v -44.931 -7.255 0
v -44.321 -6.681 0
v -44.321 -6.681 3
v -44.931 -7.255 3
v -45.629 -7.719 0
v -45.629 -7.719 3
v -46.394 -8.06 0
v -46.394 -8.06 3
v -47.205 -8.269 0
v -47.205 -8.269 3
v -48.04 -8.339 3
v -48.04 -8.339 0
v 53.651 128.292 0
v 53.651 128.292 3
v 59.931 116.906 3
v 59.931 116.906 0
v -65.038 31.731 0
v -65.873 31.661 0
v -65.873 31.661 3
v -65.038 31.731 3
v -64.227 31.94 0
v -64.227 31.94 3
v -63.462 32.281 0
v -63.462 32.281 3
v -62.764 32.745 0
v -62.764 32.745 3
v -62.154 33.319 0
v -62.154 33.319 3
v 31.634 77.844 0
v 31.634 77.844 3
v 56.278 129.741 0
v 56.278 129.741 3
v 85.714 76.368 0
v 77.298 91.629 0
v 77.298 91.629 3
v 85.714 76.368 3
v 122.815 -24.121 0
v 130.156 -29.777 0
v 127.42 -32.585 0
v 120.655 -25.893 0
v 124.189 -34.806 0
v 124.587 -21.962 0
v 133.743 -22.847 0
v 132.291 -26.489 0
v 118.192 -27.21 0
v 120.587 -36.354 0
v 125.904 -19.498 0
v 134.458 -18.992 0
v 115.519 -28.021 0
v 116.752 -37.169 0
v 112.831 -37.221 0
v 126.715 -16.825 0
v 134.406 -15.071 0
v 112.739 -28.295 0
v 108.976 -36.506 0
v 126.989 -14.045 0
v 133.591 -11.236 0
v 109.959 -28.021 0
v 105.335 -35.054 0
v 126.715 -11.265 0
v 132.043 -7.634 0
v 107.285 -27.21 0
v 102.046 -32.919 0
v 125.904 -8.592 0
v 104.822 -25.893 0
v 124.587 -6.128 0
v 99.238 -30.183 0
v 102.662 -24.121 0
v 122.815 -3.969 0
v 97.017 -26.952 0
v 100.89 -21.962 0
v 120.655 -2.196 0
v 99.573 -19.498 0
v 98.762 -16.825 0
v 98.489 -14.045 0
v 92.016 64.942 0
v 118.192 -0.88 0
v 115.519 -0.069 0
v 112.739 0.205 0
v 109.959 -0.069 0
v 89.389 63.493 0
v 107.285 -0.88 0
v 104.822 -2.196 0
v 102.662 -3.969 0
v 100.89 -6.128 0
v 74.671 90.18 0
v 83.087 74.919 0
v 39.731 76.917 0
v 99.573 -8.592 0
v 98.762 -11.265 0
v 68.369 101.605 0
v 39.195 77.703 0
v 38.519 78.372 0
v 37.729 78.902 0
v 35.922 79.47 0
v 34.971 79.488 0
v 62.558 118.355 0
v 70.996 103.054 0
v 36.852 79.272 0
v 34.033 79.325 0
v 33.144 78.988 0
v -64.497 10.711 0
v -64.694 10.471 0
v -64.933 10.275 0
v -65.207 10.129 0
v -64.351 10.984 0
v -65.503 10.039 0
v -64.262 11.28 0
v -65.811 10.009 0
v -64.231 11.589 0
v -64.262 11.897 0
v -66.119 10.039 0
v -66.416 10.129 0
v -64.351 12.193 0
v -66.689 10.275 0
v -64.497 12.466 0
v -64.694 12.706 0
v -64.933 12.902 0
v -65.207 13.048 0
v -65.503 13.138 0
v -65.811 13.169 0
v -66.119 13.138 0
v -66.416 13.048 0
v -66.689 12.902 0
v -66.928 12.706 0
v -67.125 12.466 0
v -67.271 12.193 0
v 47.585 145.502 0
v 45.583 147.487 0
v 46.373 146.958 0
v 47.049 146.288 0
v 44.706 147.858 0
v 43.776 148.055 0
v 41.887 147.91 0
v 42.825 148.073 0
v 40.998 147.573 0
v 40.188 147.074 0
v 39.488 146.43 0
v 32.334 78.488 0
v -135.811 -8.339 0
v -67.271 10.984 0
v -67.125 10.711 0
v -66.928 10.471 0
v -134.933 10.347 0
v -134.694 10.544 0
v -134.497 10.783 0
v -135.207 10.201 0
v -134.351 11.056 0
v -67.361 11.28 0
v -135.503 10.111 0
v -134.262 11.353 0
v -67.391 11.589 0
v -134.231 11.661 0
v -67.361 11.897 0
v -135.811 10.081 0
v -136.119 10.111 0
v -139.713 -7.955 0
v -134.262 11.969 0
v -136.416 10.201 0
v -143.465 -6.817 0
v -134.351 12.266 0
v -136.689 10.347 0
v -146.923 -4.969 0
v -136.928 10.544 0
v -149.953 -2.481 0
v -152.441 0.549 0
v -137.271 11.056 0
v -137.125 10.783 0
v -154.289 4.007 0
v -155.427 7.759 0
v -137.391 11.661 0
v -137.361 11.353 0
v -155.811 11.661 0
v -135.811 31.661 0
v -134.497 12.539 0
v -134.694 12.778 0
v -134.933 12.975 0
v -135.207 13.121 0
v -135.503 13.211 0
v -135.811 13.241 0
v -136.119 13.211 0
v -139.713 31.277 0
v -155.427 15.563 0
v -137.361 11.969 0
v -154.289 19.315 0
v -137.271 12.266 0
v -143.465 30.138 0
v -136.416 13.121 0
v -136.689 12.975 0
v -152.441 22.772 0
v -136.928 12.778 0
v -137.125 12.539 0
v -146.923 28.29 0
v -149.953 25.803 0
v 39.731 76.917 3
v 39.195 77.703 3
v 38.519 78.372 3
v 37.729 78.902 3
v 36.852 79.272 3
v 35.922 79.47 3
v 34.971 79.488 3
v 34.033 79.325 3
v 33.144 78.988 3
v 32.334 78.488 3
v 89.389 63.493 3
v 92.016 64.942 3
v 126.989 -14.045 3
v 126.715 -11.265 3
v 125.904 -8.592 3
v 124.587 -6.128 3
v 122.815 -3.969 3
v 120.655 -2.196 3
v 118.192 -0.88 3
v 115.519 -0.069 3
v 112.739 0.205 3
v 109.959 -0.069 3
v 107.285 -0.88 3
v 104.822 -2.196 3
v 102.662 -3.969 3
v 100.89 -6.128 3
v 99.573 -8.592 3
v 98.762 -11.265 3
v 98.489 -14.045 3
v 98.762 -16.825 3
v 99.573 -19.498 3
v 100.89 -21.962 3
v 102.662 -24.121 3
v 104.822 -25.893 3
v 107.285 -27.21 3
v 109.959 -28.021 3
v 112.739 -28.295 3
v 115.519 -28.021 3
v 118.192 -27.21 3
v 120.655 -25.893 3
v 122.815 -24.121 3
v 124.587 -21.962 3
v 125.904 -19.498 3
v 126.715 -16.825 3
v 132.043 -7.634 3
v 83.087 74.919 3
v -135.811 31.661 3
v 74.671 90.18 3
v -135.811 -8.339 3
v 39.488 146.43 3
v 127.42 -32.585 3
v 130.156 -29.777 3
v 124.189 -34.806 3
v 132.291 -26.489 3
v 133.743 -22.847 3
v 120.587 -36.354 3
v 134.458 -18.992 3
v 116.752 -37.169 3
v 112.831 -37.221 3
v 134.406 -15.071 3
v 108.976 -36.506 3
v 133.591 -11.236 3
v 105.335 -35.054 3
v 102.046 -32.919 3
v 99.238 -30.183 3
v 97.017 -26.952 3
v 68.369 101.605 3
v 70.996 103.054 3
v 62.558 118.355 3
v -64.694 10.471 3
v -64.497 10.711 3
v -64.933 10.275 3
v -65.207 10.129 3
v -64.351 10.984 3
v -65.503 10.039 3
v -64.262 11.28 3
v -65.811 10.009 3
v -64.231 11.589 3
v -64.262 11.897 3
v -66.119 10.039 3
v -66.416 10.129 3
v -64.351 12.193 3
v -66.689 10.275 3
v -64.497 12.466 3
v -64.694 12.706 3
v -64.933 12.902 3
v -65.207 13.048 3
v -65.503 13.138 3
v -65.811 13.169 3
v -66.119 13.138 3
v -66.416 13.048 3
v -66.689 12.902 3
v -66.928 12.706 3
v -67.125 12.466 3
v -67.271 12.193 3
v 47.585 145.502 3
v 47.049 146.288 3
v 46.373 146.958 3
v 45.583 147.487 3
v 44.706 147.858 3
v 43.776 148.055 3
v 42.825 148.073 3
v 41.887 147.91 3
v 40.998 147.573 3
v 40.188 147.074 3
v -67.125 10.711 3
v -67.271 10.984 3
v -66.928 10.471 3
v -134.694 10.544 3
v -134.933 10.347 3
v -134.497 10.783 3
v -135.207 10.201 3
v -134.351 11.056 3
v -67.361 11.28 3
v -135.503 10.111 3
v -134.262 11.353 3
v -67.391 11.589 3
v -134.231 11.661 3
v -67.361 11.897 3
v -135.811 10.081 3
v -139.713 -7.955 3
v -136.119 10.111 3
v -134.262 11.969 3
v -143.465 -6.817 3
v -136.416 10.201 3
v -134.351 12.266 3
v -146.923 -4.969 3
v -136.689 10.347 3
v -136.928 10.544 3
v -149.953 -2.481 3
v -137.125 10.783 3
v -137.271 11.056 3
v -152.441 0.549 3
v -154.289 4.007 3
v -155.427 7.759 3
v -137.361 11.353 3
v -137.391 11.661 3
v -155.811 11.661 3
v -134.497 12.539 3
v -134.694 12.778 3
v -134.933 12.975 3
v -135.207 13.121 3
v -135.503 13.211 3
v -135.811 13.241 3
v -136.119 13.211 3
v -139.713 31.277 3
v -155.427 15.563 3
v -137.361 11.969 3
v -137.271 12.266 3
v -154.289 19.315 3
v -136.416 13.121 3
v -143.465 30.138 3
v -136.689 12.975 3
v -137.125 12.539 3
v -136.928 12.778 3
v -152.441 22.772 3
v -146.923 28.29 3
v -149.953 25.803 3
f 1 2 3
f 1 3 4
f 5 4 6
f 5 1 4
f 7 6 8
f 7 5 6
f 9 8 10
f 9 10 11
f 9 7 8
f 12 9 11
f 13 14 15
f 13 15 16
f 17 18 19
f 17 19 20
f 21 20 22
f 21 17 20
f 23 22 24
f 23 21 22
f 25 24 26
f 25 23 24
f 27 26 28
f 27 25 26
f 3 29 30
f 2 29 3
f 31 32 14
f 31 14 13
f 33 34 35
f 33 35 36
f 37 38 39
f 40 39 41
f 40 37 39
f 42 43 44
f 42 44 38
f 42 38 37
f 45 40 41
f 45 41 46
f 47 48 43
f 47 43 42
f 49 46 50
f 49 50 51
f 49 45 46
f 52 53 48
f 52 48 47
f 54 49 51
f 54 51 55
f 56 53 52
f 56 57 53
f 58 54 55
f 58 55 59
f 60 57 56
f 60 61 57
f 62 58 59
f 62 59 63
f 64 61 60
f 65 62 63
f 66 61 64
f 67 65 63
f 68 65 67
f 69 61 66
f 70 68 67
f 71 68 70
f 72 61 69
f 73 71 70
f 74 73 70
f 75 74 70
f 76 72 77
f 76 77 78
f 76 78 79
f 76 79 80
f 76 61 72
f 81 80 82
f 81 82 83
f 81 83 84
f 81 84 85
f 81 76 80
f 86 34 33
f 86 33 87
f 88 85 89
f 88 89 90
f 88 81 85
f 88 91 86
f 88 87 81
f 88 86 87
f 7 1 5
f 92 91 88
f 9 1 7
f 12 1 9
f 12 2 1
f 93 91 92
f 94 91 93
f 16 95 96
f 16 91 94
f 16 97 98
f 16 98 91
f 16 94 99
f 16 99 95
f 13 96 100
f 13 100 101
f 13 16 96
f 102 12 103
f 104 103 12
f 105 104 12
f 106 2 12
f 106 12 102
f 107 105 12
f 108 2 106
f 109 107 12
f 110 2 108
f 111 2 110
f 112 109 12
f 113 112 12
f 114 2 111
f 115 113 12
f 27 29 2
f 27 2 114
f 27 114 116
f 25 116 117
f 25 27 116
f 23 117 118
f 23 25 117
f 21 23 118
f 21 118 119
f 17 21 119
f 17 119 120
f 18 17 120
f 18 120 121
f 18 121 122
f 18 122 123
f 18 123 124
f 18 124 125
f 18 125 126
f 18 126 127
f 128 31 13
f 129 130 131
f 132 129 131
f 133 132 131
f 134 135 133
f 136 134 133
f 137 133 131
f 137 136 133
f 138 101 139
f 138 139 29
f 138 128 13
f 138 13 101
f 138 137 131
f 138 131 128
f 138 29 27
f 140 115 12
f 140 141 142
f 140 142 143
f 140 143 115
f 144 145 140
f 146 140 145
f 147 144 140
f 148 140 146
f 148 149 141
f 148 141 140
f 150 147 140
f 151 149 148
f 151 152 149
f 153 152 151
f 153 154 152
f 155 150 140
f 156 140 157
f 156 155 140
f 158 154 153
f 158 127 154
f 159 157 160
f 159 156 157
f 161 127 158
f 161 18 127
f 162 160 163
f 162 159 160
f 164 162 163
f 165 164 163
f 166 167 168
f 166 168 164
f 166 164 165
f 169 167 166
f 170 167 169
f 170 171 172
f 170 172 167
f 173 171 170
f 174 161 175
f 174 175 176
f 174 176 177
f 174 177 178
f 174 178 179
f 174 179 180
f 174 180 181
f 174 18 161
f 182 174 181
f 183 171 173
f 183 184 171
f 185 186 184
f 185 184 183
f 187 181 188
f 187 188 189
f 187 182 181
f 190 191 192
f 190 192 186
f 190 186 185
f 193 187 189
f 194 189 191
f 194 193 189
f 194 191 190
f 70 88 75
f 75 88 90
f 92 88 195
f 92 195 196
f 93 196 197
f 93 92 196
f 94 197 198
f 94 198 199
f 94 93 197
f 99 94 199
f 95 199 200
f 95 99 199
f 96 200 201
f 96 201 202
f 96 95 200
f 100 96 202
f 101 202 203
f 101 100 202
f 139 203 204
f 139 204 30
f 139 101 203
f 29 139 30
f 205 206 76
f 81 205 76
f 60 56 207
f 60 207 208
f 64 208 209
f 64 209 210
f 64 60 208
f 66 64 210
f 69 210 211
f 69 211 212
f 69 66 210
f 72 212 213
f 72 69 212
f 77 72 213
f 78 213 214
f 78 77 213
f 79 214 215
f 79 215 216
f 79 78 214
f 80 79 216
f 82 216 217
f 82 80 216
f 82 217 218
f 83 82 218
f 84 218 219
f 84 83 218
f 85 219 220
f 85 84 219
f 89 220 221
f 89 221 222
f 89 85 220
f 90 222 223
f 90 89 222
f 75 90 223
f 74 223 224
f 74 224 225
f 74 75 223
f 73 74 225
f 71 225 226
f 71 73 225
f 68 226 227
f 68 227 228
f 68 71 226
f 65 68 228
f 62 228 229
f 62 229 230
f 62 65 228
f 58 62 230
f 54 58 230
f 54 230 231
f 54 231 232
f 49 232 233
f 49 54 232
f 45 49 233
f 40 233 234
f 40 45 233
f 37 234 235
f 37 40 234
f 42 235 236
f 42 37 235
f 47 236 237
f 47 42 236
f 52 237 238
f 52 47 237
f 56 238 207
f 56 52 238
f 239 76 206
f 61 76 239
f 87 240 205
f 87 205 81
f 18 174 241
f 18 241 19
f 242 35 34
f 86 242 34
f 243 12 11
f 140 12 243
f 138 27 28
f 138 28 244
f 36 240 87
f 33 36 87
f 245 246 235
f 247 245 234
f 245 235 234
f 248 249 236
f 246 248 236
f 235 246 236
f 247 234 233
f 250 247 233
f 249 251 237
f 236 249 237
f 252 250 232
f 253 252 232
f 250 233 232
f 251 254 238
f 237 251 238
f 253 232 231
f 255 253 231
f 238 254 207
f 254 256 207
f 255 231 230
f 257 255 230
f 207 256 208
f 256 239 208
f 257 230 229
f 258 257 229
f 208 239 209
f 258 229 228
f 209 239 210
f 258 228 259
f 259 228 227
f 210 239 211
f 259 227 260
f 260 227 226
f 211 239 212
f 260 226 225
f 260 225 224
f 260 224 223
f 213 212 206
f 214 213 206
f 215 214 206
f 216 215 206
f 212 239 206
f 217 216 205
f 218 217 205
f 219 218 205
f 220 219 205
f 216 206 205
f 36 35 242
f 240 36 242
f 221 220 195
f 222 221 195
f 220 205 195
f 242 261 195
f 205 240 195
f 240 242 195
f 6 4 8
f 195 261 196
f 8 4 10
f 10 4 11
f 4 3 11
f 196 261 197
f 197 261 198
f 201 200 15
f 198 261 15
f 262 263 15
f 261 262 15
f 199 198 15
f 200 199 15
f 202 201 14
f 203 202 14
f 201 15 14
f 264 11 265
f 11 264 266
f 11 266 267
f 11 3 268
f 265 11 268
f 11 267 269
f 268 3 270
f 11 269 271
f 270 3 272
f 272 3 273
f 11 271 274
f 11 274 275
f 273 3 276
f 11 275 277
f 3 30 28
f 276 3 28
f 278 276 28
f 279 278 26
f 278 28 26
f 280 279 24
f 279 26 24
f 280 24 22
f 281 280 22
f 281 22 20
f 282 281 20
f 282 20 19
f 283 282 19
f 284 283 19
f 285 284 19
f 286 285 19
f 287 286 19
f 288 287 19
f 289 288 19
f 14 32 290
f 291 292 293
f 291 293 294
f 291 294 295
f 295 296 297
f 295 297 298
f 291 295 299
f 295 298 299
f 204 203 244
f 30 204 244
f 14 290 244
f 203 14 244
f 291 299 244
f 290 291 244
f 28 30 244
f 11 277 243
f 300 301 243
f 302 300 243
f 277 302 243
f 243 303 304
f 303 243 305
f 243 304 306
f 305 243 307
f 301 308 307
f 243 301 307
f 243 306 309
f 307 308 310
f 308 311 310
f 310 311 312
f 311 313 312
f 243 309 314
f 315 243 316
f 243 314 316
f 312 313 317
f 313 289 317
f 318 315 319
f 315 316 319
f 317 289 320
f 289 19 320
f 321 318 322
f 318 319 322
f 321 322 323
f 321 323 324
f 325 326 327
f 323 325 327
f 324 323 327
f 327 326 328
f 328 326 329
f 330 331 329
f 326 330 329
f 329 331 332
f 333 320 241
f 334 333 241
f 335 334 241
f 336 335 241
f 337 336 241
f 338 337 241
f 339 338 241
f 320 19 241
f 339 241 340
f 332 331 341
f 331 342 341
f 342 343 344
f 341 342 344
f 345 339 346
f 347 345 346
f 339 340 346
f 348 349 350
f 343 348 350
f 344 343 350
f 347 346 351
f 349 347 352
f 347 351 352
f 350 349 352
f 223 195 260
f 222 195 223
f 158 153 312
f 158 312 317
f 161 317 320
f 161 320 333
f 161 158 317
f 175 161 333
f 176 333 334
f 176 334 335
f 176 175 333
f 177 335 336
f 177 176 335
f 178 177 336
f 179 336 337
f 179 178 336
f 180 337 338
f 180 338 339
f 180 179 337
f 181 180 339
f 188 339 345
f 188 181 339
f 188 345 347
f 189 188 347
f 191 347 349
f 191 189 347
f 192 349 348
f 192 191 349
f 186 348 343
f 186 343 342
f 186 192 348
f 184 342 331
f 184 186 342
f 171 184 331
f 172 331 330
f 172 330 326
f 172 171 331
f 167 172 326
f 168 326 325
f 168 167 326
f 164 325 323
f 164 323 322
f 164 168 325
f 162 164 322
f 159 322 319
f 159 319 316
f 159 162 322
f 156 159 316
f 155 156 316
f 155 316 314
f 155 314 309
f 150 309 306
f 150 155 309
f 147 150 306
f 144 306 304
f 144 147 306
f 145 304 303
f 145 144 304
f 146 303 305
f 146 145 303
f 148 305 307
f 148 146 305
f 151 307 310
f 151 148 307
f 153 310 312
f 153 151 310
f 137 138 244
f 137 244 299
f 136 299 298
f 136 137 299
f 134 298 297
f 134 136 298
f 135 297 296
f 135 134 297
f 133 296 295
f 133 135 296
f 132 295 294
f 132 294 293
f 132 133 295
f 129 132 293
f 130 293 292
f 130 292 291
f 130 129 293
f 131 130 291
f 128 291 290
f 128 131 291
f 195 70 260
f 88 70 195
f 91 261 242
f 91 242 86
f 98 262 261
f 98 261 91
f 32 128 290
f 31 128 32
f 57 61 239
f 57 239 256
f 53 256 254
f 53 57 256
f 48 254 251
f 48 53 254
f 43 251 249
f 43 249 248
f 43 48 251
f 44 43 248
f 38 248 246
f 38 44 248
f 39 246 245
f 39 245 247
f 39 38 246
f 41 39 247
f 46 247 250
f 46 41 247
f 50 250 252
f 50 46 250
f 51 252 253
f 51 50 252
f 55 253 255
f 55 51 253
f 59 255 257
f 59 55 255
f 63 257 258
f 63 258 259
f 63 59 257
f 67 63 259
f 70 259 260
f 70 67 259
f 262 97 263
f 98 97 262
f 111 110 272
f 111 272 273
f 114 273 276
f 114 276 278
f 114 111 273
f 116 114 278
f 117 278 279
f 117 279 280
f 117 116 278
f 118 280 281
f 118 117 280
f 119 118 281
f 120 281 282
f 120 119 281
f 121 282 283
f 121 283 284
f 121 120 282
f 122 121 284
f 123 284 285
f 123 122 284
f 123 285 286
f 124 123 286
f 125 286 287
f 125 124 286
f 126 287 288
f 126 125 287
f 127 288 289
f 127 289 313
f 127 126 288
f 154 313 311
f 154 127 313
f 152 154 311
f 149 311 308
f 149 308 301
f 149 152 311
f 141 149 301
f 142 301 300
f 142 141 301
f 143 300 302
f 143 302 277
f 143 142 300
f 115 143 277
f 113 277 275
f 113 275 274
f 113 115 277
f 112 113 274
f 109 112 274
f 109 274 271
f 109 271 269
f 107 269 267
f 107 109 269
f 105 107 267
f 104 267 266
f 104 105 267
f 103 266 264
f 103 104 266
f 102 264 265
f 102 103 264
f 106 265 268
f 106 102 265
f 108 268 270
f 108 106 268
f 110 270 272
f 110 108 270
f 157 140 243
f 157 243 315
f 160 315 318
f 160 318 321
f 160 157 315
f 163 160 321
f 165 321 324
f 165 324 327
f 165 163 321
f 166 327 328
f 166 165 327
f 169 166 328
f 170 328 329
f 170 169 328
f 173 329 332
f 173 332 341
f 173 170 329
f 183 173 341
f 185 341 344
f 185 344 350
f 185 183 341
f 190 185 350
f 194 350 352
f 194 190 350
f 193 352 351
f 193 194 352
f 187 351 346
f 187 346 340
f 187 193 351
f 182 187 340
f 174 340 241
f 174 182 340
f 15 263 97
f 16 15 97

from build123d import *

# Parameters (mm, degrees)
CROQUIS1_R              = 1.58
CROQUIS1_R_2            = 14.25
SALIENTE_EXTRUIR1_DEPTH = 3
CROQUIS3_W              = 3
CROQUIS3_H              = 13.002457907
CROQUIS3_H_2            = 13.048194377
CROQUIS3_H_3            = 13.048194378
CORTAR_EXTRUIR1_DEPTH   = 3


with BuildPart() as part:
    # Croquis1 → Saliente-Extruir1 (new body)
    with BuildSketch(Plane.XY):
        with BuildLine():
            Line((-135.811178416, 31.660861846), (-65.873242367, 31.660861846))
            ThreePointArc((-65.873242367, 31.660861846), (-63.837291884, 32.094144685), (-62.154198363, 33.318899594))
            Line((-62.154198363, 33.318899594), (39.488020824, 146.429658271))
            ThreePointArc((39.488020824, 146.429658271), (43.775922453, 148.055230719), (47.585333219, 145.502393908))
            Line((47.585333219, 145.502393908), (132.043103592, -7.634273033))
            ThreePointArc((132.043103592, -7.634273033), (124.188821584, -34.806138154), (97.016956463, -26.951856146))
            Line((97.016956463, -26.951856146), (39.731279169, 76.917067288))
            ThreePointArc((39.731279169, 76.917067288), (35.921868403, 79.4699041), (31.633966774, 77.844331652))
            Line((31.633966774, 77.844331652), (-44.321252629, -6.681100406))
            ThreePointArc((-44.321252629, -6.681100406), (-46.00434615, -7.905855315), (-48.040296633, -8.339138154))
            Line((-48.040296633, -8.339138154), (-135.811178416, -8.339138154))
            ThreePointArc((-135.811178416, -8.339138154), (-155.811178416, 11.660861846), (-135.811178416, 31.660861846))
        make_face()
        with Locations((-135.811178416, 11.660861846)):
            Circle(CROQUIS1_R, mode=Mode.SUBTRACT)
        with Locations((-65.81121578, 11.5885363)):
            Circle(CROQUIS1_R, mode=Mode.SUBTRACT)
        with Locations((112.738617641, -14.044921514)):
            Circle(CROQUIS1_R_2, mode=Mode.SUBTRACT)
    extrude(amount=SALIENTE_EXTRUIR1_DEPTH)

    # Croquis3 → Cortar-Extruir1 (cut)
    with BuildSketch(Plane(origin=(98.018165522, 54.058873563, 0), x_dir=(0, 0, -1), z_dir=(0.875653678, 0.482939578, 0))):
        with Locations((-1.5, 79.927636726)):
            Rectangle(CROQUIS3_W, CROQUIS3_H)
        with Locations((-1.5, 49.42886568)):
            Rectangle(CROQUIS3_W, CROQUIS3_H_2)
        with Locations((-1.5, 18.952962868)):
            Rectangle(CROQUIS3_W, CROQUIS3_H_3)
    extrude(amount=-CORTAR_EXTRUIR1_DEPTH, mode=Mode.SUBTRACT)


solid = part.part
